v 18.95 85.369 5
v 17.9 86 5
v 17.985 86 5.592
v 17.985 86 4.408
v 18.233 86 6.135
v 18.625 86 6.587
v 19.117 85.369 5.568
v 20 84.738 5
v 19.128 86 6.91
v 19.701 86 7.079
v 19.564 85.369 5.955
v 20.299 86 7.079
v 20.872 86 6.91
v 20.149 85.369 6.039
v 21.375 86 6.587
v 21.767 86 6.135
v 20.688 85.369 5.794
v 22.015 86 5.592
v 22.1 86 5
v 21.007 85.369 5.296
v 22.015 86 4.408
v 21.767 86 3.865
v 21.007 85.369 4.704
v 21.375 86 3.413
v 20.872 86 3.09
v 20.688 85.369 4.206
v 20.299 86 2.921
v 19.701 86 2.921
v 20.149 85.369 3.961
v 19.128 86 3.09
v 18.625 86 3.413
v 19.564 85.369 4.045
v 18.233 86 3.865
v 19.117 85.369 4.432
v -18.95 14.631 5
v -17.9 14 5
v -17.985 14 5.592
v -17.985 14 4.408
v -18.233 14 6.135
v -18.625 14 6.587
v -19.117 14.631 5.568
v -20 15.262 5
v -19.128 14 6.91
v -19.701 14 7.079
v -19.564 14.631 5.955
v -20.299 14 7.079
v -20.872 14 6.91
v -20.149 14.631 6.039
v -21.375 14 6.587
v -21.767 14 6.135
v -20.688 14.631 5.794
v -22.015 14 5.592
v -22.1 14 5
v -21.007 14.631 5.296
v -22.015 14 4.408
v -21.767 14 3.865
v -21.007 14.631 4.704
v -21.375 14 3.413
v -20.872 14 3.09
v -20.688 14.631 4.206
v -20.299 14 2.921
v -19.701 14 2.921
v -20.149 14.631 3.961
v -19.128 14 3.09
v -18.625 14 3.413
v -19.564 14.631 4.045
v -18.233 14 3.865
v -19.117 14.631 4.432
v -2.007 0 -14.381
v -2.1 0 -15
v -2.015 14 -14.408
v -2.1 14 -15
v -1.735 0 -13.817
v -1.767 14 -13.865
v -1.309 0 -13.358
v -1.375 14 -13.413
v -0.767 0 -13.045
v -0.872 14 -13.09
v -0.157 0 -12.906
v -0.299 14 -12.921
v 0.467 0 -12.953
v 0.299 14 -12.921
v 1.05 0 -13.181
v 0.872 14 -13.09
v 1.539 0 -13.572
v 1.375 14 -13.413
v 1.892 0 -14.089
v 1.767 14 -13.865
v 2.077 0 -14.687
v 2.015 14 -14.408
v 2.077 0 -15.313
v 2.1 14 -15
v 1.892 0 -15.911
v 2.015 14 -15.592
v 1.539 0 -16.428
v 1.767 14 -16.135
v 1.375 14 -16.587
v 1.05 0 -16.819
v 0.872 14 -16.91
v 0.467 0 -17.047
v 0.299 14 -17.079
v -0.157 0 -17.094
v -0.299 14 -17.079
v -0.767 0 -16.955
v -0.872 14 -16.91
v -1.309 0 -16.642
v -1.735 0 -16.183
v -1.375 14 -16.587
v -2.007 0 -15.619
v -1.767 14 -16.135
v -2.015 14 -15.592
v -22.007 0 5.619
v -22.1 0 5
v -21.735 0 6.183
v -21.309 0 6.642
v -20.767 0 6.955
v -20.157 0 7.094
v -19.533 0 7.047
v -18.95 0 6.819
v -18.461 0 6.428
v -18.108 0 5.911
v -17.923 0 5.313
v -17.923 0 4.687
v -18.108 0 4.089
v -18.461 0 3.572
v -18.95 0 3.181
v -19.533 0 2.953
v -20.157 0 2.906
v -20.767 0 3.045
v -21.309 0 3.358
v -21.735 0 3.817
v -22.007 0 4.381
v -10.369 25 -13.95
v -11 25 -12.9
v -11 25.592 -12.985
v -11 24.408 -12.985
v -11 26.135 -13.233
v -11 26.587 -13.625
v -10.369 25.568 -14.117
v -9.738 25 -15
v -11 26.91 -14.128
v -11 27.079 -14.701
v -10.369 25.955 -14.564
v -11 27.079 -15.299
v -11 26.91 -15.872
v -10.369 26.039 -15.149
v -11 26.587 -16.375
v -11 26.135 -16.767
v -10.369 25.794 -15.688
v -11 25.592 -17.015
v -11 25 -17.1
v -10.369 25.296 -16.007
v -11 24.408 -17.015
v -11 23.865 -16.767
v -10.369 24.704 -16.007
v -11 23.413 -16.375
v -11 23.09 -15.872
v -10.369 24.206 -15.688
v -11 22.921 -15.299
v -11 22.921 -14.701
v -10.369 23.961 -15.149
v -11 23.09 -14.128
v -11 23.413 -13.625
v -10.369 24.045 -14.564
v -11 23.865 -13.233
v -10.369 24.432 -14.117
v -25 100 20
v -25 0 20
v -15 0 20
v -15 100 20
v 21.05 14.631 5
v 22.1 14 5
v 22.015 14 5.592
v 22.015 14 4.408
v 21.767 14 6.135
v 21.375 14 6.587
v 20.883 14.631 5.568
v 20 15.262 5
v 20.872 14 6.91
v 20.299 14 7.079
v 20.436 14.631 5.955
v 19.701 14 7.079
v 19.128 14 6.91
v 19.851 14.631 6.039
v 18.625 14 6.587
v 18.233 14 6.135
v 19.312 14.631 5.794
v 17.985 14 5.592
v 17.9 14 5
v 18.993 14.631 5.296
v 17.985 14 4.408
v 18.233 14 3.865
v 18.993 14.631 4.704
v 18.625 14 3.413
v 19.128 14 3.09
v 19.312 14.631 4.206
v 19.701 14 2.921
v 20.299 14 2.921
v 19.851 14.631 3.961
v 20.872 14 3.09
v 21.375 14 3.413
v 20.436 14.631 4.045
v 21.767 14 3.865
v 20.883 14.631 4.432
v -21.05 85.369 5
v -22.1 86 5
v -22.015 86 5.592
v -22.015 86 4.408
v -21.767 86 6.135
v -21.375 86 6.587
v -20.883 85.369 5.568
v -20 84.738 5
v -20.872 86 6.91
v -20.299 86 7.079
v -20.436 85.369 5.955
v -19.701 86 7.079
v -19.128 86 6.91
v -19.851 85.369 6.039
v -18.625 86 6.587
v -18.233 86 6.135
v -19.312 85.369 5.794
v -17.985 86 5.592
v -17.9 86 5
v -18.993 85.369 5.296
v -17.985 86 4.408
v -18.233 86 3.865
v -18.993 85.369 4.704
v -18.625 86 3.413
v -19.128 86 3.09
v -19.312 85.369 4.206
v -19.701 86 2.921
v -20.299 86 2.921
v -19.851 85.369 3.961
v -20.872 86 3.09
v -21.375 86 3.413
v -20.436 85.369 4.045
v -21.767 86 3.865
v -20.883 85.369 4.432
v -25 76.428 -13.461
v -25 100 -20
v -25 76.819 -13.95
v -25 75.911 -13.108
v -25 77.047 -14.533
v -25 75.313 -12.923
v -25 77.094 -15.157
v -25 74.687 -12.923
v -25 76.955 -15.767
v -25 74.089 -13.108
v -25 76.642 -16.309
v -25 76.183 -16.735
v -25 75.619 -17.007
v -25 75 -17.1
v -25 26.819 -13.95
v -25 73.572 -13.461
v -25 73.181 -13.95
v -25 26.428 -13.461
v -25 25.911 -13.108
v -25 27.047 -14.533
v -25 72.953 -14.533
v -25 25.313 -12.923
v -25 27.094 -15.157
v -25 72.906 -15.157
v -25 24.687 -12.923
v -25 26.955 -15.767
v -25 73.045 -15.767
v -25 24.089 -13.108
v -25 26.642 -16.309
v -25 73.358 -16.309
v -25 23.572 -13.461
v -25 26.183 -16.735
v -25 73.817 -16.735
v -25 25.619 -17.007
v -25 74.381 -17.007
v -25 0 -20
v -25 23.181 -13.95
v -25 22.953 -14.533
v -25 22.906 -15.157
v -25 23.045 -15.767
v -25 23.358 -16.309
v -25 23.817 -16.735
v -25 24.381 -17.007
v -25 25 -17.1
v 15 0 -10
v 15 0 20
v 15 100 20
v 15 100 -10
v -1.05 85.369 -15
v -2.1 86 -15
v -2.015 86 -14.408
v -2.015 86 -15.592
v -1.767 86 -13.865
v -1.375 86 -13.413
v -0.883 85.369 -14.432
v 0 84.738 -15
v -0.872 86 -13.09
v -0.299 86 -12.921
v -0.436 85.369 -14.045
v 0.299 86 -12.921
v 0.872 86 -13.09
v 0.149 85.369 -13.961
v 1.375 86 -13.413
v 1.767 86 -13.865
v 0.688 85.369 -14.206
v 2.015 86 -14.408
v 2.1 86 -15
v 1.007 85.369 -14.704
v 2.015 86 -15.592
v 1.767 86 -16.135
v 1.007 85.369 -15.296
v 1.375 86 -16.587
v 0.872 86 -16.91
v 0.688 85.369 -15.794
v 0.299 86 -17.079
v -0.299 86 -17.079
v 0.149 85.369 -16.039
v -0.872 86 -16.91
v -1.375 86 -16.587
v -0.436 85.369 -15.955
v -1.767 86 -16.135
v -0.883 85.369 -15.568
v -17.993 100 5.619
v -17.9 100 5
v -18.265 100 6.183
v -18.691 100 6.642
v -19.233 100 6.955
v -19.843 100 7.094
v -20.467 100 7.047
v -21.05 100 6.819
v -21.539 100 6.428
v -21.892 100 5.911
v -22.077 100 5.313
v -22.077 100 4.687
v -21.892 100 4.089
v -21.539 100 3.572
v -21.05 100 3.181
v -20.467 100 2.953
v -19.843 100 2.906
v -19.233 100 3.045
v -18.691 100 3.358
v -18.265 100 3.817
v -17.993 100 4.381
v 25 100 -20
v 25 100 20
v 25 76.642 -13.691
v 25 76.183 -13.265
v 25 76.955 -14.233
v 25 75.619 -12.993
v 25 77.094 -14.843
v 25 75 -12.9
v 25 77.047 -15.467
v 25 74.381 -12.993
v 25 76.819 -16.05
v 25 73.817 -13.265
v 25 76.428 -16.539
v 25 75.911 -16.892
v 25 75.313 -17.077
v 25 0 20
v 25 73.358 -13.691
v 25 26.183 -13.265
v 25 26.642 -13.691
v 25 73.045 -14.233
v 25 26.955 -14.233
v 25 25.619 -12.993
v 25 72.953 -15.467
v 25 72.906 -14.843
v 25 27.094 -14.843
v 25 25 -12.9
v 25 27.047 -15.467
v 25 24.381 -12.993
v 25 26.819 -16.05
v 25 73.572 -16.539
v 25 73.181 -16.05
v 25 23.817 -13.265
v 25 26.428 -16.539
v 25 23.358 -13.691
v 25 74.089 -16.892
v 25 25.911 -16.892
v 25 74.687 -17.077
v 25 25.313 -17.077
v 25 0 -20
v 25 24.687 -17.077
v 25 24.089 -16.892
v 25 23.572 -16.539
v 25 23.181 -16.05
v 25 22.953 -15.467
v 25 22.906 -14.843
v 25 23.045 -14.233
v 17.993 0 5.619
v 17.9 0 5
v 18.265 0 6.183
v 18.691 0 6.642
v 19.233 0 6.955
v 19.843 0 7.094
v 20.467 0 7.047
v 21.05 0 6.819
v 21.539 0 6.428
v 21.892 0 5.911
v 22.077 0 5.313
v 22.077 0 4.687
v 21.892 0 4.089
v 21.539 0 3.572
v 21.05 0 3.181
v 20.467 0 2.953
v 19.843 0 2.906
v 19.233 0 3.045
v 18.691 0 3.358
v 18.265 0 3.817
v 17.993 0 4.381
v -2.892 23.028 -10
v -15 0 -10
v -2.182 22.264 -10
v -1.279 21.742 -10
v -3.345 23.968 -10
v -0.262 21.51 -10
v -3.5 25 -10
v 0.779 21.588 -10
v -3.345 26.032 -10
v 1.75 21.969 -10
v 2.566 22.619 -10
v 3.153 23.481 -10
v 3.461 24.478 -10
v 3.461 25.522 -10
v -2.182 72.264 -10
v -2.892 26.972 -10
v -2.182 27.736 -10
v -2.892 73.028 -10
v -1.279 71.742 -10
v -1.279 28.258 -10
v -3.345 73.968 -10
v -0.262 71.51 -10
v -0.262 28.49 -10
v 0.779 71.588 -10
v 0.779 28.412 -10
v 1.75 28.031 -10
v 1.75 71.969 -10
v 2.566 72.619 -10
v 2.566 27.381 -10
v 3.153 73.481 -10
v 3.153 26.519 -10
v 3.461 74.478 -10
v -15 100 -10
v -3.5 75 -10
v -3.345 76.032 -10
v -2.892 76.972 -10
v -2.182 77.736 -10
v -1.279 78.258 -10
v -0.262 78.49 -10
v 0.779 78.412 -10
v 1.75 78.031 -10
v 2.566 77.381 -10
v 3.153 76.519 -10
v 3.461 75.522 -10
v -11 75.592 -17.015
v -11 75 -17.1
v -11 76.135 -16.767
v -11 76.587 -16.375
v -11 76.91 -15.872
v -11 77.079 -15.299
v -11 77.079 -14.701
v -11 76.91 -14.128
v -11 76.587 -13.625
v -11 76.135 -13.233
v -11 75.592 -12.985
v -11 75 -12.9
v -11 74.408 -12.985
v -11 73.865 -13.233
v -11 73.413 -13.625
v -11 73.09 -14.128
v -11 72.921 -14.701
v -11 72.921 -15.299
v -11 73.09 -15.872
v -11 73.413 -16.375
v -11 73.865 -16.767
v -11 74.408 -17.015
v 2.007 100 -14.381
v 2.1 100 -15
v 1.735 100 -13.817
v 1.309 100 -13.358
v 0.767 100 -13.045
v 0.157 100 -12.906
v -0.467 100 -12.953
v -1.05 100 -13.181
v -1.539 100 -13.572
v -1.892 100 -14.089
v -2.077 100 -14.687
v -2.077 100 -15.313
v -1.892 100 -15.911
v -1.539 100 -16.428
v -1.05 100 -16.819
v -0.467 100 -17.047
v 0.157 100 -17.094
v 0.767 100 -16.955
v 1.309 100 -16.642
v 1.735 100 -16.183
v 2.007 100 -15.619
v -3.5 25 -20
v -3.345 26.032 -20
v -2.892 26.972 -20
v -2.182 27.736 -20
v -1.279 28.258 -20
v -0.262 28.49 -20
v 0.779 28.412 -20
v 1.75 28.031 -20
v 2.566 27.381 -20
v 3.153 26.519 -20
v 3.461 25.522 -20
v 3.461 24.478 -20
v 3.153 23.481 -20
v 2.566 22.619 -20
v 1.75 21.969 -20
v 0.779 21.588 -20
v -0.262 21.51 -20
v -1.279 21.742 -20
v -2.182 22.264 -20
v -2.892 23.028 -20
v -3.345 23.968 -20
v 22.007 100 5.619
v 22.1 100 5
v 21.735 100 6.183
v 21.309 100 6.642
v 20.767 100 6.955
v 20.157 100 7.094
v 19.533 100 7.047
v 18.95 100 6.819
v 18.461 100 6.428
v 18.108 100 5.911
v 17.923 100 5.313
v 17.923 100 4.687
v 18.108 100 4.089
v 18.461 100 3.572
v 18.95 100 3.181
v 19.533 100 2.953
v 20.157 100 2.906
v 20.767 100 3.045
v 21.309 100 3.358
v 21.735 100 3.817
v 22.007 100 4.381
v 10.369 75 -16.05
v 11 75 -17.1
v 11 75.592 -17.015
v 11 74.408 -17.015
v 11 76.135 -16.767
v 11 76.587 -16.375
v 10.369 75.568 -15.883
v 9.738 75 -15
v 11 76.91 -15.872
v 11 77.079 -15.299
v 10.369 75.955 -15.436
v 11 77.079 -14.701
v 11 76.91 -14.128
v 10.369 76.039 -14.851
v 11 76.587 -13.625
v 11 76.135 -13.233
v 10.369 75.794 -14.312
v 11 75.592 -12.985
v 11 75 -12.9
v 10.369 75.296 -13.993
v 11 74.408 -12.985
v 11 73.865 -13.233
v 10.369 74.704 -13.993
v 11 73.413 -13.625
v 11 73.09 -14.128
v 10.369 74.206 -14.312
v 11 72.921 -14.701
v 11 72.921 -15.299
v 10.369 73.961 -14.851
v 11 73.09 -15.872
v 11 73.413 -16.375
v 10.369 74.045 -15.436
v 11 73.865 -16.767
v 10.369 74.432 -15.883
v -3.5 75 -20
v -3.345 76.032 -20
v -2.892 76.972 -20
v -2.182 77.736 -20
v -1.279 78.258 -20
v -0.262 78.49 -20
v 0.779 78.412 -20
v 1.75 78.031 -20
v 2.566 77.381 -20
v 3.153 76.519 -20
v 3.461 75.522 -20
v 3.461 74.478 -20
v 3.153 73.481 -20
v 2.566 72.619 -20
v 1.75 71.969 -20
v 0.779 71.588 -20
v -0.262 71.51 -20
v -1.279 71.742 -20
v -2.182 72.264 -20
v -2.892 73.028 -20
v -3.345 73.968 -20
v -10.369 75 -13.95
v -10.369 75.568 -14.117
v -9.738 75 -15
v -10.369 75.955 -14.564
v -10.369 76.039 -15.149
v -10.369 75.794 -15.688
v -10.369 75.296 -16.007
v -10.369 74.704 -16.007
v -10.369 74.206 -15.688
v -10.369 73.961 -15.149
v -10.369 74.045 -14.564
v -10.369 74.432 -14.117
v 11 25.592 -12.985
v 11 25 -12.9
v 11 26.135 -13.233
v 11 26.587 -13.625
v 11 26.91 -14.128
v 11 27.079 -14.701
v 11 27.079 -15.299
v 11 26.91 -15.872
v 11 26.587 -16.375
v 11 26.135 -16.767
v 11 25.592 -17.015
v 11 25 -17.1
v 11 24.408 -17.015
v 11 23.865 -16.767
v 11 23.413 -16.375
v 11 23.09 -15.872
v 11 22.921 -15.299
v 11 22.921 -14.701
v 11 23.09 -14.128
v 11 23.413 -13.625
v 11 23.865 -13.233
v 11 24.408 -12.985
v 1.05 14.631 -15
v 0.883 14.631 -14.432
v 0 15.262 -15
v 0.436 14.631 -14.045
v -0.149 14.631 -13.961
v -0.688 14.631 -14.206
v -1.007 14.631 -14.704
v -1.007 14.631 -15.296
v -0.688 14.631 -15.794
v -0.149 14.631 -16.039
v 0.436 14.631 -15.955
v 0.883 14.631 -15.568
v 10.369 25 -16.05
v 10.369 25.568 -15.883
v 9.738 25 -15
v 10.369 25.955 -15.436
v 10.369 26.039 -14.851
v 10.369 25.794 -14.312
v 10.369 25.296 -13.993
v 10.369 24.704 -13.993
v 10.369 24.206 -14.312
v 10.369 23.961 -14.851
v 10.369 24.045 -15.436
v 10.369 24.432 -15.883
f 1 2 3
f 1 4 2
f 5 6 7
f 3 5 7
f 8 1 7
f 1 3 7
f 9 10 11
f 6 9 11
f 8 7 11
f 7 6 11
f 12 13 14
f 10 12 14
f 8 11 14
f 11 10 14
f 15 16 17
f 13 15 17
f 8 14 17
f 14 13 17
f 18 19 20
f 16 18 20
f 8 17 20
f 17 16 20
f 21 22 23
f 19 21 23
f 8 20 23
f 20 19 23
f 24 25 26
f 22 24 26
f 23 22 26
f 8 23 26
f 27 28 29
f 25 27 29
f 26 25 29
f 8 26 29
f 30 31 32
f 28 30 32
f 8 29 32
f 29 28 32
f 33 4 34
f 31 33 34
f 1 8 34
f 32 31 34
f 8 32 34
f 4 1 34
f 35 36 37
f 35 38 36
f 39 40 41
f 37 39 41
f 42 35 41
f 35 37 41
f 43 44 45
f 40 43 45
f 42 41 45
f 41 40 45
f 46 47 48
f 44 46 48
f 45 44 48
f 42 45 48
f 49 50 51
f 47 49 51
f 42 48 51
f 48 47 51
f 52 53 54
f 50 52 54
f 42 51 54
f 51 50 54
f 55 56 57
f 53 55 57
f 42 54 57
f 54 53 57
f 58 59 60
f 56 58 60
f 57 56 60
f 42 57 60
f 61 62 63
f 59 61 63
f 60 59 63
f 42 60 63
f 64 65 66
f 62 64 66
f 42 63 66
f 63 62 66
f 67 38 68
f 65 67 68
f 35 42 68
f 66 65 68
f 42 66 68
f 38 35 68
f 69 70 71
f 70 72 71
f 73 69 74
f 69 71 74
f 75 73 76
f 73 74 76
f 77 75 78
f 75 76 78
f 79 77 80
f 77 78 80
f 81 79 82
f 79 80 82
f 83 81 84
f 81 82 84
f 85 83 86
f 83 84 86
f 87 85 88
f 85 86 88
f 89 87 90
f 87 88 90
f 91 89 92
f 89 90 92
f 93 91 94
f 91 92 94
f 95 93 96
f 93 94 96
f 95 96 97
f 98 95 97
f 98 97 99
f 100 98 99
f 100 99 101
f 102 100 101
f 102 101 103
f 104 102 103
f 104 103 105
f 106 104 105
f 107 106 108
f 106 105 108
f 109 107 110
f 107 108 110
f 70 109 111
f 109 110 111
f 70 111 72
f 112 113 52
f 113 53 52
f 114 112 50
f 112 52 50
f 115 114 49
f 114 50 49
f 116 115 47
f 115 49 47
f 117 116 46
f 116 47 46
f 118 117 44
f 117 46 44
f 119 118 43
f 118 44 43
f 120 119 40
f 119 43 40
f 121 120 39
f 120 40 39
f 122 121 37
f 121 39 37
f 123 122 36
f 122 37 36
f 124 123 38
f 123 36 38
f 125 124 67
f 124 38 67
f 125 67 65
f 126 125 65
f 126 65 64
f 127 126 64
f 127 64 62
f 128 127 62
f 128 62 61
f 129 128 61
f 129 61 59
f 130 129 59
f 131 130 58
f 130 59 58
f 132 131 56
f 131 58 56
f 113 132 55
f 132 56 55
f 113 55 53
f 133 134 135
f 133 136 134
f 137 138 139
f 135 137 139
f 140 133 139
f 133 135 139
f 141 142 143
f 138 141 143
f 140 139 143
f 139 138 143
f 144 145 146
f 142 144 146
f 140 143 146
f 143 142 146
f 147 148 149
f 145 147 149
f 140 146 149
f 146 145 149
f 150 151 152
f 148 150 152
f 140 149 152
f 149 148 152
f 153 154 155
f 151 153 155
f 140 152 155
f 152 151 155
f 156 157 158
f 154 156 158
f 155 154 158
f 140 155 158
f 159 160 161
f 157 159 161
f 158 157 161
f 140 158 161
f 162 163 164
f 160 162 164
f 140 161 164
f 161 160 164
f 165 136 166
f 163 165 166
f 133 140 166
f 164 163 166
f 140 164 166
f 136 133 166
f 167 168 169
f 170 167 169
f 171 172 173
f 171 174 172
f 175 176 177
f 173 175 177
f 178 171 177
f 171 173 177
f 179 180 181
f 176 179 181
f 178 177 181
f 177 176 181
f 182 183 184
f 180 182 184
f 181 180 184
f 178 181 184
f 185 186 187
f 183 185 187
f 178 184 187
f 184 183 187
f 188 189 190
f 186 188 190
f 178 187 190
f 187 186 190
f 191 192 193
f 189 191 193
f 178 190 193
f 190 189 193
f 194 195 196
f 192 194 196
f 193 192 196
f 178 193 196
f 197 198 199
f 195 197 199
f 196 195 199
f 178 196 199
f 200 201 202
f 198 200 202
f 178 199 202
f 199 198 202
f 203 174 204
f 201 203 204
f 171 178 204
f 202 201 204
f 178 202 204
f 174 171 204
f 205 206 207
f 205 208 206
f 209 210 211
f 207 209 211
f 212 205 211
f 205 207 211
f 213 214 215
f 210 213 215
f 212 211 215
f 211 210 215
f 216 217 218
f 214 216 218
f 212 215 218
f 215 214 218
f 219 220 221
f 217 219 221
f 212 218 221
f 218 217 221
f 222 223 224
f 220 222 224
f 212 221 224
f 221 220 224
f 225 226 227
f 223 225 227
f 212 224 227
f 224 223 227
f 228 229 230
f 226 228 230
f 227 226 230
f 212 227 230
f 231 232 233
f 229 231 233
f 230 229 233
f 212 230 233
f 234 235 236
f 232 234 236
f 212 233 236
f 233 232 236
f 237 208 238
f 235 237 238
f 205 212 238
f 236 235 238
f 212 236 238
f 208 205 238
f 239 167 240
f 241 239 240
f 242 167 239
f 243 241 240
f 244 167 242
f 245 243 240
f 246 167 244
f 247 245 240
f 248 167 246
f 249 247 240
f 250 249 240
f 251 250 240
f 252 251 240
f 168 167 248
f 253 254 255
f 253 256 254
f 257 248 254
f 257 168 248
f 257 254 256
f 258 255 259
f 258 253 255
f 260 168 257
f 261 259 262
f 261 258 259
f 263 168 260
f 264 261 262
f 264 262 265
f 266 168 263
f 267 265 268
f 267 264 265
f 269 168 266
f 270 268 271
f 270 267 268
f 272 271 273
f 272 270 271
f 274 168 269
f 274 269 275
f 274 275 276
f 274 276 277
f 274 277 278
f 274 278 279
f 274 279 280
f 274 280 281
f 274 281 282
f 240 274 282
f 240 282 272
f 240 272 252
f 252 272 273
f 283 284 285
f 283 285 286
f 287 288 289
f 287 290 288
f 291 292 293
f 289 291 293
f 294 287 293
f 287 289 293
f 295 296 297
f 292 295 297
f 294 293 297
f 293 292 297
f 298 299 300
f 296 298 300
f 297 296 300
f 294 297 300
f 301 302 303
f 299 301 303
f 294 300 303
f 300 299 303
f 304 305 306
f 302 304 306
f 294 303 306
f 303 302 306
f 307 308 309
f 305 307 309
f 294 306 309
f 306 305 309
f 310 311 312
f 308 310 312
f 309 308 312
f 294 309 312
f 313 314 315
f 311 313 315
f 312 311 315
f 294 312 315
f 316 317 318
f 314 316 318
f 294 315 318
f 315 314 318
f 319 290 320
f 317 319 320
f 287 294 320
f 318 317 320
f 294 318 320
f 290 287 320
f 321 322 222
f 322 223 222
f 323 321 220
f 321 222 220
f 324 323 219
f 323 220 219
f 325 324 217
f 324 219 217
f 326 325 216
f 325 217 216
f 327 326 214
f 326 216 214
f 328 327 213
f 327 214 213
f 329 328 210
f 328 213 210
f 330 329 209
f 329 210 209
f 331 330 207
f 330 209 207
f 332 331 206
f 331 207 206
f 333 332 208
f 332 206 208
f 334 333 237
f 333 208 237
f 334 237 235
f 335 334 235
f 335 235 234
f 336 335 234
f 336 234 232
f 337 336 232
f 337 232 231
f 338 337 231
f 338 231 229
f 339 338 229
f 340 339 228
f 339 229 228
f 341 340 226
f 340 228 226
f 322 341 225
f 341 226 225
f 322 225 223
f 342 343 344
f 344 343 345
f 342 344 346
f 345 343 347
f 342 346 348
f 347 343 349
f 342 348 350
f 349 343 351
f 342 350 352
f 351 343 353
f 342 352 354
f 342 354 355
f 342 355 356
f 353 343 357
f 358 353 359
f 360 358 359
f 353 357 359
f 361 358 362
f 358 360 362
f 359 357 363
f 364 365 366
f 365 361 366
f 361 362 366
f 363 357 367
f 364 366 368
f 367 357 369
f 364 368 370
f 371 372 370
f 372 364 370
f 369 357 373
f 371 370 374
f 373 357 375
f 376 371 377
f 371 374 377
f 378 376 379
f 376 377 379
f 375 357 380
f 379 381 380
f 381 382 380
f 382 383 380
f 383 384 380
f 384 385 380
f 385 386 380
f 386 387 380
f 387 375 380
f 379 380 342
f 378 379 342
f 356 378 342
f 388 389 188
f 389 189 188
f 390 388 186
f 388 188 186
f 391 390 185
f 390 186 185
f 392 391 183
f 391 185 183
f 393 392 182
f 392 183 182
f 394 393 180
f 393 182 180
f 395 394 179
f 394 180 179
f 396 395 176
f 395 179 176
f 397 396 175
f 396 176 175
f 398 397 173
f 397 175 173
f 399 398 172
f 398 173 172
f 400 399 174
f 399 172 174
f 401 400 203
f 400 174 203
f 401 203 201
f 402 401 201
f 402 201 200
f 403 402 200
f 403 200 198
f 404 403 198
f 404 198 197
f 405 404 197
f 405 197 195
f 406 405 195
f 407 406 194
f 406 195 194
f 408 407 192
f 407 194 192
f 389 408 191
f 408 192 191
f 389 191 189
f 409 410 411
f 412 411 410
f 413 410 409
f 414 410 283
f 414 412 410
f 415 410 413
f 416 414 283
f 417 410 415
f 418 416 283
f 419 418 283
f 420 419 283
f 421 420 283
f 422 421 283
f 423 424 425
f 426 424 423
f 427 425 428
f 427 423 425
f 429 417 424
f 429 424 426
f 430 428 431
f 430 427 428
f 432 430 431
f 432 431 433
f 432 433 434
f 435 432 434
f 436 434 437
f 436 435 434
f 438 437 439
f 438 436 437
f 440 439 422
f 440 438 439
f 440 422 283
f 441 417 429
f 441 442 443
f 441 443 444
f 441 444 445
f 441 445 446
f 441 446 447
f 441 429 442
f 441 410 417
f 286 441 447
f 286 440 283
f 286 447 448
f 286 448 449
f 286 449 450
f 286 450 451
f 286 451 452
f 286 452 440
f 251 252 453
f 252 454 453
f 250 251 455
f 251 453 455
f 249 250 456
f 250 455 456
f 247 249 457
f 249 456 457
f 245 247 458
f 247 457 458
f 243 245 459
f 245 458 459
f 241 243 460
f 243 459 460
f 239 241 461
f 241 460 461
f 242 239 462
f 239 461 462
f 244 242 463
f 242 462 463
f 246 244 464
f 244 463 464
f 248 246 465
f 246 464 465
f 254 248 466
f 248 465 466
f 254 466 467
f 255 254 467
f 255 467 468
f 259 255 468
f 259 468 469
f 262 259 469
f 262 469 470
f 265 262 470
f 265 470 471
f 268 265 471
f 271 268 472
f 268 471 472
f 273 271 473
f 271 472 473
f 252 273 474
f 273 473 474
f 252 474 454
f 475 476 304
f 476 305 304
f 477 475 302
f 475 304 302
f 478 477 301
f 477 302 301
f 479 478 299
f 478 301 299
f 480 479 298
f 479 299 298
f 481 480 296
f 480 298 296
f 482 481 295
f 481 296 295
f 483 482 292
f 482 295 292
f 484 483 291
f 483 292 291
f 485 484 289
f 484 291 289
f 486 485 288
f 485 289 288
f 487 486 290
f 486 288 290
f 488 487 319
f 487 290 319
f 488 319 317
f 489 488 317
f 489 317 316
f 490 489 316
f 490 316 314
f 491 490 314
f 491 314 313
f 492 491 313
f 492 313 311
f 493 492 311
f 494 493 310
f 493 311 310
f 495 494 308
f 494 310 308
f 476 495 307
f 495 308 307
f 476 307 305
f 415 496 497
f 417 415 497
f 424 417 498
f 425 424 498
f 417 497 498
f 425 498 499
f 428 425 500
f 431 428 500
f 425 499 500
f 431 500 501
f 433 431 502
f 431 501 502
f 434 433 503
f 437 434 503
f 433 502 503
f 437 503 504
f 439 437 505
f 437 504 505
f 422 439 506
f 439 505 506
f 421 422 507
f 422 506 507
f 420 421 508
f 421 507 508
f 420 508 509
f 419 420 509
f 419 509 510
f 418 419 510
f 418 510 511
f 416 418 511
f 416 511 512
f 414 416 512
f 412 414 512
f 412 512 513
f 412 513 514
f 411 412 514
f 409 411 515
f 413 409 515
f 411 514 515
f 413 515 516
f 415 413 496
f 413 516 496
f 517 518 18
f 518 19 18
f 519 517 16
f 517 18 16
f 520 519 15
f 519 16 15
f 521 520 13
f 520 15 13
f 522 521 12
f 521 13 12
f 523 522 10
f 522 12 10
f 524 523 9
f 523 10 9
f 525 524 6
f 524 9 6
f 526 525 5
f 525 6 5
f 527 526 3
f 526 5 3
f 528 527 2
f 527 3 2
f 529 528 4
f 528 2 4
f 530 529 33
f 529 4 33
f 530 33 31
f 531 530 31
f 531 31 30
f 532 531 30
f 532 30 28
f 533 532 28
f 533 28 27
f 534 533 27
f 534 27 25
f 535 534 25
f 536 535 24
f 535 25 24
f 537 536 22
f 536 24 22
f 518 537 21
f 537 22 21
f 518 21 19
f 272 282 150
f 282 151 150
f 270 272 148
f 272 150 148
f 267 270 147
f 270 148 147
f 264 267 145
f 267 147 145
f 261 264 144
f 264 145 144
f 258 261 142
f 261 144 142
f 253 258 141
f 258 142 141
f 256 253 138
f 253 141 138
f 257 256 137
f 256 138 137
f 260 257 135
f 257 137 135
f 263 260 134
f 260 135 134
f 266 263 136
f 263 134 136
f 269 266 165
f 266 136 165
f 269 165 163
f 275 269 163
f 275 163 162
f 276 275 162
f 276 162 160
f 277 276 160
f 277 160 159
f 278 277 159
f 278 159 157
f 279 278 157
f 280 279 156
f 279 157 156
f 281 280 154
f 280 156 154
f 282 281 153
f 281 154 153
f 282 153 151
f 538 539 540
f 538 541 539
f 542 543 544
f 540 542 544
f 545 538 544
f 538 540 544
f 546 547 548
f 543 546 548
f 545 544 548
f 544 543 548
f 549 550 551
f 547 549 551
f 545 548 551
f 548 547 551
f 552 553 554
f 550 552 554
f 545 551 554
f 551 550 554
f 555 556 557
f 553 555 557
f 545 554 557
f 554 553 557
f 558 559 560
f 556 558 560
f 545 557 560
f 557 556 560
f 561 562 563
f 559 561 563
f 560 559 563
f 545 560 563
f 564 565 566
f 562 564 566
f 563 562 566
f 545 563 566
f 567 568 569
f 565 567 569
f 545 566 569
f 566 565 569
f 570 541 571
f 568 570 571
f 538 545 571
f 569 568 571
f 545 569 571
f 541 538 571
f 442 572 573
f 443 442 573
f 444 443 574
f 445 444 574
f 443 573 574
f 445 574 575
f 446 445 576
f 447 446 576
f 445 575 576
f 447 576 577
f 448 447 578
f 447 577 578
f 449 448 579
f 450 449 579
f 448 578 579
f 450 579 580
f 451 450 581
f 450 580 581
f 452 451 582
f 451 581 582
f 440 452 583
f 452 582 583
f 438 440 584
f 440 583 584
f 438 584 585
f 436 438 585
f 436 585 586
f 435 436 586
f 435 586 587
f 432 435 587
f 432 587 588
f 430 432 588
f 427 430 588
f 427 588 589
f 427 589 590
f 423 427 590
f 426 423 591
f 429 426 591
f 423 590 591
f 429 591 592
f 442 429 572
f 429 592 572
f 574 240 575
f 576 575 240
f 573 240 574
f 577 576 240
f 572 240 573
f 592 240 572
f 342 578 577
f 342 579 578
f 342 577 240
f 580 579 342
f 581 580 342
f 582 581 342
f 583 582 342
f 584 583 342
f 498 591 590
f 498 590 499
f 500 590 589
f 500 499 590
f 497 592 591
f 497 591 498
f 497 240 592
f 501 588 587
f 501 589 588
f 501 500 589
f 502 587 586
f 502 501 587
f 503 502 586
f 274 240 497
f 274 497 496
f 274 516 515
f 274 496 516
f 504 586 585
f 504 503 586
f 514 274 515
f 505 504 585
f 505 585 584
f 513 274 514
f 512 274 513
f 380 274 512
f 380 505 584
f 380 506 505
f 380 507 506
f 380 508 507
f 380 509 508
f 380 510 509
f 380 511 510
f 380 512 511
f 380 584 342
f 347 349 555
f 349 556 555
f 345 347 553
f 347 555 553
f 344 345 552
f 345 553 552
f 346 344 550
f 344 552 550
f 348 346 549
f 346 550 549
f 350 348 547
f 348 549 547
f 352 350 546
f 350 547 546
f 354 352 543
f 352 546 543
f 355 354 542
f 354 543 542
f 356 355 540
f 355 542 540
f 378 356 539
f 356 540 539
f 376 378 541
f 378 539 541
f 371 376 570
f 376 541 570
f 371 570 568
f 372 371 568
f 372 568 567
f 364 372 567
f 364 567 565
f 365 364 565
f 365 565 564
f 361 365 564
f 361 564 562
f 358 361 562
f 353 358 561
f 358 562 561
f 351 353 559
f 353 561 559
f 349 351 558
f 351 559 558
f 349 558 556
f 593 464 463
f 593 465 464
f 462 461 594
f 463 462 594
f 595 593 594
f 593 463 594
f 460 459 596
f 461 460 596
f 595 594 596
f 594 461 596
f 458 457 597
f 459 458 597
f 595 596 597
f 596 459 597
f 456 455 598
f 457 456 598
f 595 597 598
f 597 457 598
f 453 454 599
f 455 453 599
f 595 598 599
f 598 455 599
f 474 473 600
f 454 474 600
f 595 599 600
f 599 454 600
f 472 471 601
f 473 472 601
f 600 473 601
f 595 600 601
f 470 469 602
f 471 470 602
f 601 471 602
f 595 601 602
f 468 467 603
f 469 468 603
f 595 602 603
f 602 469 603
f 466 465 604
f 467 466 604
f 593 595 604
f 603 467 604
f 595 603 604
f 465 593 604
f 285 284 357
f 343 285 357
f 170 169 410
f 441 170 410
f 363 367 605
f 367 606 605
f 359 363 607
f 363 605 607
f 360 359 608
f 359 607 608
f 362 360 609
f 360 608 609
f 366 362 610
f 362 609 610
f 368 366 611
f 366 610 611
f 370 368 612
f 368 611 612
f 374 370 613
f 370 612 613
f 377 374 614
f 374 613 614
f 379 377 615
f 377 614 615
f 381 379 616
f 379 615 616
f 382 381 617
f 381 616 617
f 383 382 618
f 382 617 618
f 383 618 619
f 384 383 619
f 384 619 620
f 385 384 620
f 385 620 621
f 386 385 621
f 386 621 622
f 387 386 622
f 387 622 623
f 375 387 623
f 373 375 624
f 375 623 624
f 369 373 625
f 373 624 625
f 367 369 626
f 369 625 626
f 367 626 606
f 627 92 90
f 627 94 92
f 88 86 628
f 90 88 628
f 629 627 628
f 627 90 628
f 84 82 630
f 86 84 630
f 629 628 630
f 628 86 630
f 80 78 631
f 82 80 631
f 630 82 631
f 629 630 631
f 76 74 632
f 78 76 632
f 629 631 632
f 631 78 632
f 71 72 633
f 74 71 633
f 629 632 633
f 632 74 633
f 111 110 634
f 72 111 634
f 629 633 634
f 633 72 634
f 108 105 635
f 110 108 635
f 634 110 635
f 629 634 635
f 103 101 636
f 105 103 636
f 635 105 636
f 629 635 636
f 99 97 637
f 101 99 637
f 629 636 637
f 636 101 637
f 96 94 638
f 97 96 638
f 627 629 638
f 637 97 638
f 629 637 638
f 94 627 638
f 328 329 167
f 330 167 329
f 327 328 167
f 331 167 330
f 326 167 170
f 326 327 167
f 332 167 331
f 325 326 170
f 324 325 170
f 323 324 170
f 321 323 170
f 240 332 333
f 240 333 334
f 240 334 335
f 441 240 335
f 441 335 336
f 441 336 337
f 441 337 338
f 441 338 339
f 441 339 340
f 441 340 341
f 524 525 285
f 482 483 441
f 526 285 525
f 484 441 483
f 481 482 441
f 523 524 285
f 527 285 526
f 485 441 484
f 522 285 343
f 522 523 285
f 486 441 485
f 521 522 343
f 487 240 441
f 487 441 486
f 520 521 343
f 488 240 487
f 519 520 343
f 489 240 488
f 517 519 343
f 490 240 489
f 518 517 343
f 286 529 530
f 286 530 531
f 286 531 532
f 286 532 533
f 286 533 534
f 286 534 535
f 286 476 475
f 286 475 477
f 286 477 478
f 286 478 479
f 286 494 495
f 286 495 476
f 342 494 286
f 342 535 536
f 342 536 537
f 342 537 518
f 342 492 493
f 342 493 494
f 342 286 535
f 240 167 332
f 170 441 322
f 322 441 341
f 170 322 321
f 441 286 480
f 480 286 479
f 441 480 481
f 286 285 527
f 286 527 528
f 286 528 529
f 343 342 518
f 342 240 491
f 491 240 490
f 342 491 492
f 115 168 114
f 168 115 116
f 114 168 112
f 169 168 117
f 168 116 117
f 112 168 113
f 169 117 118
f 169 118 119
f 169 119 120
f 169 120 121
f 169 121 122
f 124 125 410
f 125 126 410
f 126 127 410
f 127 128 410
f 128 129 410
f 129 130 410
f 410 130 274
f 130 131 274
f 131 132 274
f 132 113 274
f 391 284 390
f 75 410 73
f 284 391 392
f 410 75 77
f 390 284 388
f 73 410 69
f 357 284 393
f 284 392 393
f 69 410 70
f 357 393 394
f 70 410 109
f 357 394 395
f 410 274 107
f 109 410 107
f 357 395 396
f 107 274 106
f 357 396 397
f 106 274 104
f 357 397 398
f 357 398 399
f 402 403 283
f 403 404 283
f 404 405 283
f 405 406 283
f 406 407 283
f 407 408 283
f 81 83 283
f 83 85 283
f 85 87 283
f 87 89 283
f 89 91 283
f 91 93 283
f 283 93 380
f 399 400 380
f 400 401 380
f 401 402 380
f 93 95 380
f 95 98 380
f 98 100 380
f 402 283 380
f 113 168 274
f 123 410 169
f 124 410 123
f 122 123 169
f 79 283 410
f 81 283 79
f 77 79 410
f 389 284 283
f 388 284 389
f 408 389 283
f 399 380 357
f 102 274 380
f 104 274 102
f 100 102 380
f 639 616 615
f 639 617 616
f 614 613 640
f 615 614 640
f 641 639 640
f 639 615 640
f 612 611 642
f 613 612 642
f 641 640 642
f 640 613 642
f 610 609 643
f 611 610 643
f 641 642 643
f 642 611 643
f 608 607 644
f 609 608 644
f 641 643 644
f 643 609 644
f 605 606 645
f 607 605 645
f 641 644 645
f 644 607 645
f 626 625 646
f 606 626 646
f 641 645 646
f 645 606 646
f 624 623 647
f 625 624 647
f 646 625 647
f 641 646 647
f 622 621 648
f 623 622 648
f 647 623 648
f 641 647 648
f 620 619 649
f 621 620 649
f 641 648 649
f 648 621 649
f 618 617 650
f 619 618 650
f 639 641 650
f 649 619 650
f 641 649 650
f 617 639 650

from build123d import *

# Parameters (mm, degrees)
SKETCH1_W                 = 50
SKETCH1_H                 = 40
BOSS_EXTRUDE1_DEPTH       = 100
SKETCH2_W                 = 30
SKETCH2_H                 = 30
CUT_EXTRUDE1_DEPTH        = 100
SKETCH3_R                 = 3.5
CUT_EXTRUDE2_DEPTH        = 10
M5X0_8_TAPPED_HOLE1_D     = 4.2
M5X0_8_TAPPED_HOLE1_DEPTH = 14
M5X0_8_TAPPED_HOLE1_TIP   = 1.2618073
M5X0_8_TAPPED_HOLE2_D     = 4.2
M5X0_8_TAPPED_HOLE2_DEPTH = 14
M5X0_8_TAPPED_HOLE2_TIP   = 1.2618073
M5X0_8_TAPPED_HOLE3_D     = 4.2
M5X0_8_TAPPED_HOLE3_DEPTH = 14
M5X0_8_TAPPED_HOLE3_TIP   = 1.2618073
M5X0_8_TAPPED_HOLE4_D     = 4.2
M5X0_8_TAPPED_HOLE4_DEPTH = 14
M5X0_8_TAPPED_HOLE4_TIP   = 1.2618073


with BuildPart() as part:
    # Sketch1 → Boss-Extrude1 (new body)
    with BuildSketch(Plane(origin=(0, 0, 0), x_dir=(1, 0, 0), z_dir=(0, 1, 0))):
        Rectangle(SKETCH1_W, SKETCH1_H)
    extrude(amount=BOSS_EXTRUDE1_DEPTH)

    # Sketch2 → Cut-Extrude1 (cut)
    with BuildSketch(Plane(origin=(0, 100, 0), x_dir=(1, 0, 0), z_dir=(0, 1, 0))):
        with Locations((0, -5)):
            Rectangle(SKETCH2_W, SKETCH2_H)
    extrude(amount=-CUT_EXTRUDE1_DEPTH, mode=Mode.SUBTRACT)

    # Sketch3 → Cut-Extrude2 (cut)
    with BuildSketch(Plane(origin=(0, 0, -20), x_dir=(-1, 0, 0), z_dir=(0, 0, -1))):
        with Locations((0, 25)):
            Circle(SKETCH3_R)
        with Locations((0, 75)):
            Circle(SKETCH3_R)
    extrude(amount=-CUT_EXTRUDE2_DEPTH, mode=Mode.SUBTRACT)

    # M5x0.8 Tapped Hole1
    with Locations(Plane.XZ):
        with Locations((0, -15), (-20, 5), (20, 5)):
            Hole(M5X0_8_TAPPED_HOLE1_D / 2, depth=M5X0_8_TAPPED_HOLE1_DEPTH)
            with Locations((0, 0, -(M5X0_8_TAPPED_HOLE1_DEPTH + M5X0_8_TAPPED_HOLE1_TIP / 2))):  # 118° drill point
                Cone(0, M5X0_8_TAPPED_HOLE1_D / 2, M5X0_8_TAPPED_HOLE1_TIP, mode=Mode.SUBTRACT)

    # M5x0.8 Tapped Hole2
    with Locations(Plane(origin=(0, 100, 0), x_dir=(-1, 0, 0), z_dir=(0, 1, 0))):
        with Locations((20, 5), (-20, 5), (0, -15)):
            Hole(M5X0_8_TAPPED_HOLE2_D / 2, depth=M5X0_8_TAPPED_HOLE2_DEPTH)
            with Locations((0, 0, -(M5X0_8_TAPPED_HOLE2_DEPTH + M5X0_8_TAPPED_HOLE2_TIP / 2))):  # 118° drill point
                Cone(0, M5X0_8_TAPPED_HOLE2_D / 2, M5X0_8_TAPPED_HOLE2_TIP, mode=Mode.SUBTRACT)

    # M5x0.8 Tapped Hole3
    with Locations(Plane(origin=(25, 0, 0), x_dir=(0, 0, -1), z_dir=(1, 0, 0))):
        with Locations((15, 75), (15, 25)):
            Hole(M5X0_8_TAPPED_HOLE3_D / 2, depth=M5X0_8_TAPPED_HOLE3_DEPTH)
            with Locations((0, 0, -(M5X0_8_TAPPED_HOLE3_DEPTH + M5X0_8_TAPPED_HOLE3_TIP / 2))):  # 118° drill point
                Cone(0, M5X0_8_TAPPED_HOLE3_D / 2, M5X0_8_TAPPED_HOLE3_TIP, mode=Mode.SUBTRACT)

    # M5x0.8 Tapped Hole4
    with Locations(Plane.ZY.offset(25)):
        with Locations((-15, 75), (-15, 25)):
            Hole(M5X0_8_TAPPED_HOLE4_D / 2, depth=M5X0_8_TAPPED_HOLE4_DEPTH)
            with Locations((0, 0, -(M5X0_8_TAPPED_HOLE4_DEPTH + M5X0_8_TAPPED_HOLE4_TIP / 2))):  # 118° drill point
                Cone(0, M5X0_8_TAPPED_HOLE4_D / 2, M5X0_8_TAPPED_HOLE4_TIP, mode=Mode.SUBTRACT)


solid = part.part
